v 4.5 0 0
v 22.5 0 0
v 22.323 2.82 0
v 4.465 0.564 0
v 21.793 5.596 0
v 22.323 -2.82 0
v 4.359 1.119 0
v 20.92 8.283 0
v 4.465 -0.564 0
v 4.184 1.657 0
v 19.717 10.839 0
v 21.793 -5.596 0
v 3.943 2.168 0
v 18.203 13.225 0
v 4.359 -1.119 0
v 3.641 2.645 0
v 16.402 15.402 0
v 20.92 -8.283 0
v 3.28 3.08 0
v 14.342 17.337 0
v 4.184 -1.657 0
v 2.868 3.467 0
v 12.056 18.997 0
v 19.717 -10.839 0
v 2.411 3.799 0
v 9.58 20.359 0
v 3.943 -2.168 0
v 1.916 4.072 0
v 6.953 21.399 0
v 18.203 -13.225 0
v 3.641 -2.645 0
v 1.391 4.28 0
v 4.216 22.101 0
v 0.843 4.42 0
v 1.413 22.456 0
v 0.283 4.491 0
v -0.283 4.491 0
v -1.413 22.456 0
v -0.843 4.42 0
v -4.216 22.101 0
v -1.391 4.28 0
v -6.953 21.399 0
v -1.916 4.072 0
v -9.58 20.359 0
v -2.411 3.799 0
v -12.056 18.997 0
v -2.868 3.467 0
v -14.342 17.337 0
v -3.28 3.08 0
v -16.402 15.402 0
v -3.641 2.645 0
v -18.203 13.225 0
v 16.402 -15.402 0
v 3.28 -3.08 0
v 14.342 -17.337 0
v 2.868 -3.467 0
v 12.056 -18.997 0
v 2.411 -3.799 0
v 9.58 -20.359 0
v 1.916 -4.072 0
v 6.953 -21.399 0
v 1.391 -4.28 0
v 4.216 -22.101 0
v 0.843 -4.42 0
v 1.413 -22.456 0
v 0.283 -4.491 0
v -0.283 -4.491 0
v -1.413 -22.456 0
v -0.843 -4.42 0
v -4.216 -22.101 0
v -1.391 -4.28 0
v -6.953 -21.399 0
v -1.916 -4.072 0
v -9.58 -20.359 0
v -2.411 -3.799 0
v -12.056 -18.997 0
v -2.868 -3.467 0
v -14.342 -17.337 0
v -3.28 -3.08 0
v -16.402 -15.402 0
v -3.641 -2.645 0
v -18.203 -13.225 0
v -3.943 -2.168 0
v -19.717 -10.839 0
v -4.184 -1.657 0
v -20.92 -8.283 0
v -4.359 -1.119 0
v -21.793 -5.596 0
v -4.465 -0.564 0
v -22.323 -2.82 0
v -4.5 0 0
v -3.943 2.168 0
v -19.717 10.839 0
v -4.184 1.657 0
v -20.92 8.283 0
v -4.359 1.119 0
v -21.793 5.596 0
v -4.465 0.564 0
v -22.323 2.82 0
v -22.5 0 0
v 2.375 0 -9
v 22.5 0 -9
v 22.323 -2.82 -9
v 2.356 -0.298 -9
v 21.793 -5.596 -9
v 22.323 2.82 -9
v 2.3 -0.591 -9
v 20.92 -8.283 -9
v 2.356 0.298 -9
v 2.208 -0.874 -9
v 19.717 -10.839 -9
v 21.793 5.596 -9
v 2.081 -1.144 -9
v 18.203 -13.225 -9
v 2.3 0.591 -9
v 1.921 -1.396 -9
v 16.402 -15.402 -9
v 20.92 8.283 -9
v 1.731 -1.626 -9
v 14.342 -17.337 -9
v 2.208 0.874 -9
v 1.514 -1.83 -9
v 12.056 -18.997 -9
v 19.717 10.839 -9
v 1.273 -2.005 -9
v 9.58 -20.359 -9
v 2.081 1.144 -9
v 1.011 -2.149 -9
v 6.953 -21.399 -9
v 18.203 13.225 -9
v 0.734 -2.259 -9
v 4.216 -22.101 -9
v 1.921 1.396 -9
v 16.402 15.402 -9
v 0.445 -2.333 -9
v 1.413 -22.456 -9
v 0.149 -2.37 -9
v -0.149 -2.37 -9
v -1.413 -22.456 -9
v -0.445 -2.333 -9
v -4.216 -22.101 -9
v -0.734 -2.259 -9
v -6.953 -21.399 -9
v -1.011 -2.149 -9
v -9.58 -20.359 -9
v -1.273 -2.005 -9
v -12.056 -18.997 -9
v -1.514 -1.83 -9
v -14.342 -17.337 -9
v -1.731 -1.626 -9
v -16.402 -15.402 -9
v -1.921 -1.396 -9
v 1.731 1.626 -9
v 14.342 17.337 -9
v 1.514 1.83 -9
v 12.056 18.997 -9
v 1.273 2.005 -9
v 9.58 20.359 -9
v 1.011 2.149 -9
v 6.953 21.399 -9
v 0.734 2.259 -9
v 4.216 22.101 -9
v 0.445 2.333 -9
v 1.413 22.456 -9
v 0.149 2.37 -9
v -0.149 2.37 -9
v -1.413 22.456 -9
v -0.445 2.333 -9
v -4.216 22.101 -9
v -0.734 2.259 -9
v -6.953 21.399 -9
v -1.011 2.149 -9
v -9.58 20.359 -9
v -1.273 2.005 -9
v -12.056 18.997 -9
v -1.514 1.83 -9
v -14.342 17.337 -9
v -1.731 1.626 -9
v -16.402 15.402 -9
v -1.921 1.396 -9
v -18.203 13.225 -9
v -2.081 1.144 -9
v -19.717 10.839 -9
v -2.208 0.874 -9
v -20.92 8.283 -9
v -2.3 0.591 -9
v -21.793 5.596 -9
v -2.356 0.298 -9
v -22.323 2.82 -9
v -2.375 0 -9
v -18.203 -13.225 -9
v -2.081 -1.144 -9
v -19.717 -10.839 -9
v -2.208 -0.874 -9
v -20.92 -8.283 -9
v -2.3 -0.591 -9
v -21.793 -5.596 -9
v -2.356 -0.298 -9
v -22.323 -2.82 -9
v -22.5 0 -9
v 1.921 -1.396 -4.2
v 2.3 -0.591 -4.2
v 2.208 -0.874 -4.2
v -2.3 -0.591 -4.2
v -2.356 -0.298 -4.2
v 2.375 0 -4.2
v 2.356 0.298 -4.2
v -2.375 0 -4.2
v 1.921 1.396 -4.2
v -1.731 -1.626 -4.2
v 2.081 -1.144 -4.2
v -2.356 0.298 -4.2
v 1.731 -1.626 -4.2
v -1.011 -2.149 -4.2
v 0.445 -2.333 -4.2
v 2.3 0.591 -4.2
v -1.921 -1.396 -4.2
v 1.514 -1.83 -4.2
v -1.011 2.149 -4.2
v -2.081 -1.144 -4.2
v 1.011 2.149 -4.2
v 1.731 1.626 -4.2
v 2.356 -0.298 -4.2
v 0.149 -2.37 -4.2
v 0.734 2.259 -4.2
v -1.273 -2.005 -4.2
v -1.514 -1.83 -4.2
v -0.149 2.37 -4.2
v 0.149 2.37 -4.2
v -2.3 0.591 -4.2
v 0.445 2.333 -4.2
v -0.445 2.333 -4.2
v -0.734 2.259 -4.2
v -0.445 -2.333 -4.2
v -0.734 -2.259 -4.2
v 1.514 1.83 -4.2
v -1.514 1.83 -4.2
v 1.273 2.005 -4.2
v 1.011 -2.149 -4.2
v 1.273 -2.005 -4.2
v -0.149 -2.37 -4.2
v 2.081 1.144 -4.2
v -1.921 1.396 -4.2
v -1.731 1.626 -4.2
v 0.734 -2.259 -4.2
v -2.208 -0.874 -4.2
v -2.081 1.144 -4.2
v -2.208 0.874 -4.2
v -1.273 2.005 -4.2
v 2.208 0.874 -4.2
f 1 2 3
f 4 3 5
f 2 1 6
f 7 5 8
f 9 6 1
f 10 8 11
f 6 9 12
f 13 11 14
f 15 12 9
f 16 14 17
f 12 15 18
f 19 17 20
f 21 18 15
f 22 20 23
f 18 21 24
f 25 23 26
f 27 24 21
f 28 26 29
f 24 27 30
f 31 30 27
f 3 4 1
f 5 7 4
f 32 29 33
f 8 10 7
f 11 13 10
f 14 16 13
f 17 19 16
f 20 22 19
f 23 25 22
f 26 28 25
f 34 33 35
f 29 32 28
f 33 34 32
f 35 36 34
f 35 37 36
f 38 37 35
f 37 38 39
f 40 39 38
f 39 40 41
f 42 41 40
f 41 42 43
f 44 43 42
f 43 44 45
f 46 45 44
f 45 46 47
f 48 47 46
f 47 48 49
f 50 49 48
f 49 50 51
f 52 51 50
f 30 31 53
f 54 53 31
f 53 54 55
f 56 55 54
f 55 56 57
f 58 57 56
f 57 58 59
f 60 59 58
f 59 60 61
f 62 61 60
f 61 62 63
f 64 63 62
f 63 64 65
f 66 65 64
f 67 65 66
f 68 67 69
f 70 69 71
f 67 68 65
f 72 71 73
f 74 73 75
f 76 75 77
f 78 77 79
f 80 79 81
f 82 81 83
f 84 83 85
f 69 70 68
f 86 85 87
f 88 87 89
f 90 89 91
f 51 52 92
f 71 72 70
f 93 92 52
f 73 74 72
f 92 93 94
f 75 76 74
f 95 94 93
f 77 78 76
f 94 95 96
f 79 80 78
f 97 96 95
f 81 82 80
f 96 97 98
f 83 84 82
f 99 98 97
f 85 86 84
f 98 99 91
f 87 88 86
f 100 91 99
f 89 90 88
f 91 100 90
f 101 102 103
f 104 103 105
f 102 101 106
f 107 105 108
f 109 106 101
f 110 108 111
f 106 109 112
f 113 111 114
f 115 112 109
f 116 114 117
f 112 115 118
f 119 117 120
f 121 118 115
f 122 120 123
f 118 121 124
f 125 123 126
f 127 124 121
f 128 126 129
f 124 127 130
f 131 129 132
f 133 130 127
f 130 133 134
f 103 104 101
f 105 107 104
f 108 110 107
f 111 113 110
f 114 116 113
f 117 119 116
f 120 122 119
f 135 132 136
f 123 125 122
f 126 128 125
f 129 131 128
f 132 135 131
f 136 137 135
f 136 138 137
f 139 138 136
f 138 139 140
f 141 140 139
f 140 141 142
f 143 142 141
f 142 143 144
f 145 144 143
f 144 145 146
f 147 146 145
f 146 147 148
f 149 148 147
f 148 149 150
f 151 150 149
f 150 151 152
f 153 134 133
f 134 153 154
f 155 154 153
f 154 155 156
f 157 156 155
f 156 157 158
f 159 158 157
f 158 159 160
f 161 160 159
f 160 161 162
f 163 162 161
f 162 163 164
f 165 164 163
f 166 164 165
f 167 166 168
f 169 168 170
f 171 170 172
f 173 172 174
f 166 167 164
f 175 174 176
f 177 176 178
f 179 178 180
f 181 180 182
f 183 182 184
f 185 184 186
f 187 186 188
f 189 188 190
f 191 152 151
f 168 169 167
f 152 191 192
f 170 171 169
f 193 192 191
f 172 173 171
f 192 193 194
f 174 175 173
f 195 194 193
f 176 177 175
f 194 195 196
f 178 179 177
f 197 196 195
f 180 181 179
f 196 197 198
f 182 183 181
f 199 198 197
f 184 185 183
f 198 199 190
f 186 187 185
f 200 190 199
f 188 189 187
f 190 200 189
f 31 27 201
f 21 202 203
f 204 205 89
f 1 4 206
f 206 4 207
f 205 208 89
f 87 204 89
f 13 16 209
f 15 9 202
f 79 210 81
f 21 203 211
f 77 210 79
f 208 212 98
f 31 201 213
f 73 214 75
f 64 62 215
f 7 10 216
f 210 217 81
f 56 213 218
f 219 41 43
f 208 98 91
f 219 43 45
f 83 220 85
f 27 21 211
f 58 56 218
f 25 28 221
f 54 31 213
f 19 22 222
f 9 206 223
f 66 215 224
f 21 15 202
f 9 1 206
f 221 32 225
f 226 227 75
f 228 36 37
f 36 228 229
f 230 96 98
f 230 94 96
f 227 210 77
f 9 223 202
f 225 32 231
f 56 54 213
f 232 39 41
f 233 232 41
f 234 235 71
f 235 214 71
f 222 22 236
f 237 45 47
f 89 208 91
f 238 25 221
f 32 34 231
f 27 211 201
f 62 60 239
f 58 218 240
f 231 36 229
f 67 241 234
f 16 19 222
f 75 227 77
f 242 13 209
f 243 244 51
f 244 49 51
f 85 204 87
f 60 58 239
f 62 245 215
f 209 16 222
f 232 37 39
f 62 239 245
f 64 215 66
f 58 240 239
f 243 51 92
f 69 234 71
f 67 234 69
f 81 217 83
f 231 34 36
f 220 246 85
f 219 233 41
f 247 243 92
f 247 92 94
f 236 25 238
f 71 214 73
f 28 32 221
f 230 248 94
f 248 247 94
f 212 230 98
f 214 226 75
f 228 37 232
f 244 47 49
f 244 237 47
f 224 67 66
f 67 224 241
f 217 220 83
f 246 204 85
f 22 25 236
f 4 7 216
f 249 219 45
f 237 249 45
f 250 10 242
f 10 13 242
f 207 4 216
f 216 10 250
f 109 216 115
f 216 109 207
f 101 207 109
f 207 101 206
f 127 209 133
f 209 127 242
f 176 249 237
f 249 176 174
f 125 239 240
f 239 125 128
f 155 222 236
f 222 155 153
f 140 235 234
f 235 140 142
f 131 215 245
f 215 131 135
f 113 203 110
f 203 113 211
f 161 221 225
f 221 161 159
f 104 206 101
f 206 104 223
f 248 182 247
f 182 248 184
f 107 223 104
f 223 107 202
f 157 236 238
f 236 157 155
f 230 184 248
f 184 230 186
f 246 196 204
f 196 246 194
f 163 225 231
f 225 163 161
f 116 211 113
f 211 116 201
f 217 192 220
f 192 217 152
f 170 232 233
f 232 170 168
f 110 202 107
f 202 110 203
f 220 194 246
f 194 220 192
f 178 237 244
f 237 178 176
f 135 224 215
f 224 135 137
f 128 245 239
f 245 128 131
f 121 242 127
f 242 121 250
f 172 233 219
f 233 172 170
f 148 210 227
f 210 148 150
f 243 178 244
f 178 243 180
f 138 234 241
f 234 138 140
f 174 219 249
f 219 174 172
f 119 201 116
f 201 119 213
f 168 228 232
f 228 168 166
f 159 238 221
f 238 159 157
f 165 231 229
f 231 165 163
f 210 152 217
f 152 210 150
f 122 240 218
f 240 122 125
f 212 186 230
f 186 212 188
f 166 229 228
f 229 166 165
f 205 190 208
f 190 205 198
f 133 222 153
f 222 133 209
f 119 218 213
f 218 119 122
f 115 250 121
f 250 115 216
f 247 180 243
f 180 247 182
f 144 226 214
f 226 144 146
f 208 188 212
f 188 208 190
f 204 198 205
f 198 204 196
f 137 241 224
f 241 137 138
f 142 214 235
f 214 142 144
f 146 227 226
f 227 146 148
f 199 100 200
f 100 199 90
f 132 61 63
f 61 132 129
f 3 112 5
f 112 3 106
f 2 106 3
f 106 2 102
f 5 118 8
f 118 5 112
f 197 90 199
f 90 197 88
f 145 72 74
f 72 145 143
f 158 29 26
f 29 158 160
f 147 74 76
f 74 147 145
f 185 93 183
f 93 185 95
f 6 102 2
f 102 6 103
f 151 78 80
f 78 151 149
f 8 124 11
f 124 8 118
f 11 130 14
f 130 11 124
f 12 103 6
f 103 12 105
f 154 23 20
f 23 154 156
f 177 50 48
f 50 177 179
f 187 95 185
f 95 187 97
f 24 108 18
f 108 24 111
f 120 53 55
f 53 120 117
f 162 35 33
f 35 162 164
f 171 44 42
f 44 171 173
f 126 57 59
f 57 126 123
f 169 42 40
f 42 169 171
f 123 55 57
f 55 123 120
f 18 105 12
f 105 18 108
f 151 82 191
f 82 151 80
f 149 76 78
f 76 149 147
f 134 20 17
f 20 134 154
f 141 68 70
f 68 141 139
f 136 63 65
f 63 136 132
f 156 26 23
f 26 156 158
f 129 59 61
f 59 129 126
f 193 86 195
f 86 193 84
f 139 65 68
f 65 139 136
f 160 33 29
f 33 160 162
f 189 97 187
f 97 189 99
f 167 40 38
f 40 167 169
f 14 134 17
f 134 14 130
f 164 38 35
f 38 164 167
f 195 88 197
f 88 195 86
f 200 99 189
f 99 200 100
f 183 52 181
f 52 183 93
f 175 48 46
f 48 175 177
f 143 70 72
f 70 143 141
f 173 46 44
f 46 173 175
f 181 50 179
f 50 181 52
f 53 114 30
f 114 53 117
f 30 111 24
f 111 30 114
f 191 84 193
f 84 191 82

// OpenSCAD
$fn = 50;


difference() {
	union() {
		translate(v = [0, 0, -9.0000000000]) {
			cylinder(h = 9, r = 22.5000000000);
		}
	}
	union() {
		translate(v = [0, 0, 0]) {
			rotate(a = [0, 0, 0]) {
				difference() {
					union() {
						#translate(v = [0, 0, -9.0000000000]) {
							cylinder(h = 9, r = 2.2500000000);
						}
						#translate(v = [0, 0, -4.2000000000]) {
							cylinder(h = 4.2000000000, r1 = 2.3750000000, r2 = 4.5000000000);
						}
						#translate(v = [0, 0, -9.0000000000]) {
							cylinder(h = 9, r = 2.3750000000);
						}
						#translate(v = [0, 0, -9.0000000000]) {
							cylinder(h = 9, r = 2.2500000000);
						}
					}
					union();
				}
			}
		}
	}
}
